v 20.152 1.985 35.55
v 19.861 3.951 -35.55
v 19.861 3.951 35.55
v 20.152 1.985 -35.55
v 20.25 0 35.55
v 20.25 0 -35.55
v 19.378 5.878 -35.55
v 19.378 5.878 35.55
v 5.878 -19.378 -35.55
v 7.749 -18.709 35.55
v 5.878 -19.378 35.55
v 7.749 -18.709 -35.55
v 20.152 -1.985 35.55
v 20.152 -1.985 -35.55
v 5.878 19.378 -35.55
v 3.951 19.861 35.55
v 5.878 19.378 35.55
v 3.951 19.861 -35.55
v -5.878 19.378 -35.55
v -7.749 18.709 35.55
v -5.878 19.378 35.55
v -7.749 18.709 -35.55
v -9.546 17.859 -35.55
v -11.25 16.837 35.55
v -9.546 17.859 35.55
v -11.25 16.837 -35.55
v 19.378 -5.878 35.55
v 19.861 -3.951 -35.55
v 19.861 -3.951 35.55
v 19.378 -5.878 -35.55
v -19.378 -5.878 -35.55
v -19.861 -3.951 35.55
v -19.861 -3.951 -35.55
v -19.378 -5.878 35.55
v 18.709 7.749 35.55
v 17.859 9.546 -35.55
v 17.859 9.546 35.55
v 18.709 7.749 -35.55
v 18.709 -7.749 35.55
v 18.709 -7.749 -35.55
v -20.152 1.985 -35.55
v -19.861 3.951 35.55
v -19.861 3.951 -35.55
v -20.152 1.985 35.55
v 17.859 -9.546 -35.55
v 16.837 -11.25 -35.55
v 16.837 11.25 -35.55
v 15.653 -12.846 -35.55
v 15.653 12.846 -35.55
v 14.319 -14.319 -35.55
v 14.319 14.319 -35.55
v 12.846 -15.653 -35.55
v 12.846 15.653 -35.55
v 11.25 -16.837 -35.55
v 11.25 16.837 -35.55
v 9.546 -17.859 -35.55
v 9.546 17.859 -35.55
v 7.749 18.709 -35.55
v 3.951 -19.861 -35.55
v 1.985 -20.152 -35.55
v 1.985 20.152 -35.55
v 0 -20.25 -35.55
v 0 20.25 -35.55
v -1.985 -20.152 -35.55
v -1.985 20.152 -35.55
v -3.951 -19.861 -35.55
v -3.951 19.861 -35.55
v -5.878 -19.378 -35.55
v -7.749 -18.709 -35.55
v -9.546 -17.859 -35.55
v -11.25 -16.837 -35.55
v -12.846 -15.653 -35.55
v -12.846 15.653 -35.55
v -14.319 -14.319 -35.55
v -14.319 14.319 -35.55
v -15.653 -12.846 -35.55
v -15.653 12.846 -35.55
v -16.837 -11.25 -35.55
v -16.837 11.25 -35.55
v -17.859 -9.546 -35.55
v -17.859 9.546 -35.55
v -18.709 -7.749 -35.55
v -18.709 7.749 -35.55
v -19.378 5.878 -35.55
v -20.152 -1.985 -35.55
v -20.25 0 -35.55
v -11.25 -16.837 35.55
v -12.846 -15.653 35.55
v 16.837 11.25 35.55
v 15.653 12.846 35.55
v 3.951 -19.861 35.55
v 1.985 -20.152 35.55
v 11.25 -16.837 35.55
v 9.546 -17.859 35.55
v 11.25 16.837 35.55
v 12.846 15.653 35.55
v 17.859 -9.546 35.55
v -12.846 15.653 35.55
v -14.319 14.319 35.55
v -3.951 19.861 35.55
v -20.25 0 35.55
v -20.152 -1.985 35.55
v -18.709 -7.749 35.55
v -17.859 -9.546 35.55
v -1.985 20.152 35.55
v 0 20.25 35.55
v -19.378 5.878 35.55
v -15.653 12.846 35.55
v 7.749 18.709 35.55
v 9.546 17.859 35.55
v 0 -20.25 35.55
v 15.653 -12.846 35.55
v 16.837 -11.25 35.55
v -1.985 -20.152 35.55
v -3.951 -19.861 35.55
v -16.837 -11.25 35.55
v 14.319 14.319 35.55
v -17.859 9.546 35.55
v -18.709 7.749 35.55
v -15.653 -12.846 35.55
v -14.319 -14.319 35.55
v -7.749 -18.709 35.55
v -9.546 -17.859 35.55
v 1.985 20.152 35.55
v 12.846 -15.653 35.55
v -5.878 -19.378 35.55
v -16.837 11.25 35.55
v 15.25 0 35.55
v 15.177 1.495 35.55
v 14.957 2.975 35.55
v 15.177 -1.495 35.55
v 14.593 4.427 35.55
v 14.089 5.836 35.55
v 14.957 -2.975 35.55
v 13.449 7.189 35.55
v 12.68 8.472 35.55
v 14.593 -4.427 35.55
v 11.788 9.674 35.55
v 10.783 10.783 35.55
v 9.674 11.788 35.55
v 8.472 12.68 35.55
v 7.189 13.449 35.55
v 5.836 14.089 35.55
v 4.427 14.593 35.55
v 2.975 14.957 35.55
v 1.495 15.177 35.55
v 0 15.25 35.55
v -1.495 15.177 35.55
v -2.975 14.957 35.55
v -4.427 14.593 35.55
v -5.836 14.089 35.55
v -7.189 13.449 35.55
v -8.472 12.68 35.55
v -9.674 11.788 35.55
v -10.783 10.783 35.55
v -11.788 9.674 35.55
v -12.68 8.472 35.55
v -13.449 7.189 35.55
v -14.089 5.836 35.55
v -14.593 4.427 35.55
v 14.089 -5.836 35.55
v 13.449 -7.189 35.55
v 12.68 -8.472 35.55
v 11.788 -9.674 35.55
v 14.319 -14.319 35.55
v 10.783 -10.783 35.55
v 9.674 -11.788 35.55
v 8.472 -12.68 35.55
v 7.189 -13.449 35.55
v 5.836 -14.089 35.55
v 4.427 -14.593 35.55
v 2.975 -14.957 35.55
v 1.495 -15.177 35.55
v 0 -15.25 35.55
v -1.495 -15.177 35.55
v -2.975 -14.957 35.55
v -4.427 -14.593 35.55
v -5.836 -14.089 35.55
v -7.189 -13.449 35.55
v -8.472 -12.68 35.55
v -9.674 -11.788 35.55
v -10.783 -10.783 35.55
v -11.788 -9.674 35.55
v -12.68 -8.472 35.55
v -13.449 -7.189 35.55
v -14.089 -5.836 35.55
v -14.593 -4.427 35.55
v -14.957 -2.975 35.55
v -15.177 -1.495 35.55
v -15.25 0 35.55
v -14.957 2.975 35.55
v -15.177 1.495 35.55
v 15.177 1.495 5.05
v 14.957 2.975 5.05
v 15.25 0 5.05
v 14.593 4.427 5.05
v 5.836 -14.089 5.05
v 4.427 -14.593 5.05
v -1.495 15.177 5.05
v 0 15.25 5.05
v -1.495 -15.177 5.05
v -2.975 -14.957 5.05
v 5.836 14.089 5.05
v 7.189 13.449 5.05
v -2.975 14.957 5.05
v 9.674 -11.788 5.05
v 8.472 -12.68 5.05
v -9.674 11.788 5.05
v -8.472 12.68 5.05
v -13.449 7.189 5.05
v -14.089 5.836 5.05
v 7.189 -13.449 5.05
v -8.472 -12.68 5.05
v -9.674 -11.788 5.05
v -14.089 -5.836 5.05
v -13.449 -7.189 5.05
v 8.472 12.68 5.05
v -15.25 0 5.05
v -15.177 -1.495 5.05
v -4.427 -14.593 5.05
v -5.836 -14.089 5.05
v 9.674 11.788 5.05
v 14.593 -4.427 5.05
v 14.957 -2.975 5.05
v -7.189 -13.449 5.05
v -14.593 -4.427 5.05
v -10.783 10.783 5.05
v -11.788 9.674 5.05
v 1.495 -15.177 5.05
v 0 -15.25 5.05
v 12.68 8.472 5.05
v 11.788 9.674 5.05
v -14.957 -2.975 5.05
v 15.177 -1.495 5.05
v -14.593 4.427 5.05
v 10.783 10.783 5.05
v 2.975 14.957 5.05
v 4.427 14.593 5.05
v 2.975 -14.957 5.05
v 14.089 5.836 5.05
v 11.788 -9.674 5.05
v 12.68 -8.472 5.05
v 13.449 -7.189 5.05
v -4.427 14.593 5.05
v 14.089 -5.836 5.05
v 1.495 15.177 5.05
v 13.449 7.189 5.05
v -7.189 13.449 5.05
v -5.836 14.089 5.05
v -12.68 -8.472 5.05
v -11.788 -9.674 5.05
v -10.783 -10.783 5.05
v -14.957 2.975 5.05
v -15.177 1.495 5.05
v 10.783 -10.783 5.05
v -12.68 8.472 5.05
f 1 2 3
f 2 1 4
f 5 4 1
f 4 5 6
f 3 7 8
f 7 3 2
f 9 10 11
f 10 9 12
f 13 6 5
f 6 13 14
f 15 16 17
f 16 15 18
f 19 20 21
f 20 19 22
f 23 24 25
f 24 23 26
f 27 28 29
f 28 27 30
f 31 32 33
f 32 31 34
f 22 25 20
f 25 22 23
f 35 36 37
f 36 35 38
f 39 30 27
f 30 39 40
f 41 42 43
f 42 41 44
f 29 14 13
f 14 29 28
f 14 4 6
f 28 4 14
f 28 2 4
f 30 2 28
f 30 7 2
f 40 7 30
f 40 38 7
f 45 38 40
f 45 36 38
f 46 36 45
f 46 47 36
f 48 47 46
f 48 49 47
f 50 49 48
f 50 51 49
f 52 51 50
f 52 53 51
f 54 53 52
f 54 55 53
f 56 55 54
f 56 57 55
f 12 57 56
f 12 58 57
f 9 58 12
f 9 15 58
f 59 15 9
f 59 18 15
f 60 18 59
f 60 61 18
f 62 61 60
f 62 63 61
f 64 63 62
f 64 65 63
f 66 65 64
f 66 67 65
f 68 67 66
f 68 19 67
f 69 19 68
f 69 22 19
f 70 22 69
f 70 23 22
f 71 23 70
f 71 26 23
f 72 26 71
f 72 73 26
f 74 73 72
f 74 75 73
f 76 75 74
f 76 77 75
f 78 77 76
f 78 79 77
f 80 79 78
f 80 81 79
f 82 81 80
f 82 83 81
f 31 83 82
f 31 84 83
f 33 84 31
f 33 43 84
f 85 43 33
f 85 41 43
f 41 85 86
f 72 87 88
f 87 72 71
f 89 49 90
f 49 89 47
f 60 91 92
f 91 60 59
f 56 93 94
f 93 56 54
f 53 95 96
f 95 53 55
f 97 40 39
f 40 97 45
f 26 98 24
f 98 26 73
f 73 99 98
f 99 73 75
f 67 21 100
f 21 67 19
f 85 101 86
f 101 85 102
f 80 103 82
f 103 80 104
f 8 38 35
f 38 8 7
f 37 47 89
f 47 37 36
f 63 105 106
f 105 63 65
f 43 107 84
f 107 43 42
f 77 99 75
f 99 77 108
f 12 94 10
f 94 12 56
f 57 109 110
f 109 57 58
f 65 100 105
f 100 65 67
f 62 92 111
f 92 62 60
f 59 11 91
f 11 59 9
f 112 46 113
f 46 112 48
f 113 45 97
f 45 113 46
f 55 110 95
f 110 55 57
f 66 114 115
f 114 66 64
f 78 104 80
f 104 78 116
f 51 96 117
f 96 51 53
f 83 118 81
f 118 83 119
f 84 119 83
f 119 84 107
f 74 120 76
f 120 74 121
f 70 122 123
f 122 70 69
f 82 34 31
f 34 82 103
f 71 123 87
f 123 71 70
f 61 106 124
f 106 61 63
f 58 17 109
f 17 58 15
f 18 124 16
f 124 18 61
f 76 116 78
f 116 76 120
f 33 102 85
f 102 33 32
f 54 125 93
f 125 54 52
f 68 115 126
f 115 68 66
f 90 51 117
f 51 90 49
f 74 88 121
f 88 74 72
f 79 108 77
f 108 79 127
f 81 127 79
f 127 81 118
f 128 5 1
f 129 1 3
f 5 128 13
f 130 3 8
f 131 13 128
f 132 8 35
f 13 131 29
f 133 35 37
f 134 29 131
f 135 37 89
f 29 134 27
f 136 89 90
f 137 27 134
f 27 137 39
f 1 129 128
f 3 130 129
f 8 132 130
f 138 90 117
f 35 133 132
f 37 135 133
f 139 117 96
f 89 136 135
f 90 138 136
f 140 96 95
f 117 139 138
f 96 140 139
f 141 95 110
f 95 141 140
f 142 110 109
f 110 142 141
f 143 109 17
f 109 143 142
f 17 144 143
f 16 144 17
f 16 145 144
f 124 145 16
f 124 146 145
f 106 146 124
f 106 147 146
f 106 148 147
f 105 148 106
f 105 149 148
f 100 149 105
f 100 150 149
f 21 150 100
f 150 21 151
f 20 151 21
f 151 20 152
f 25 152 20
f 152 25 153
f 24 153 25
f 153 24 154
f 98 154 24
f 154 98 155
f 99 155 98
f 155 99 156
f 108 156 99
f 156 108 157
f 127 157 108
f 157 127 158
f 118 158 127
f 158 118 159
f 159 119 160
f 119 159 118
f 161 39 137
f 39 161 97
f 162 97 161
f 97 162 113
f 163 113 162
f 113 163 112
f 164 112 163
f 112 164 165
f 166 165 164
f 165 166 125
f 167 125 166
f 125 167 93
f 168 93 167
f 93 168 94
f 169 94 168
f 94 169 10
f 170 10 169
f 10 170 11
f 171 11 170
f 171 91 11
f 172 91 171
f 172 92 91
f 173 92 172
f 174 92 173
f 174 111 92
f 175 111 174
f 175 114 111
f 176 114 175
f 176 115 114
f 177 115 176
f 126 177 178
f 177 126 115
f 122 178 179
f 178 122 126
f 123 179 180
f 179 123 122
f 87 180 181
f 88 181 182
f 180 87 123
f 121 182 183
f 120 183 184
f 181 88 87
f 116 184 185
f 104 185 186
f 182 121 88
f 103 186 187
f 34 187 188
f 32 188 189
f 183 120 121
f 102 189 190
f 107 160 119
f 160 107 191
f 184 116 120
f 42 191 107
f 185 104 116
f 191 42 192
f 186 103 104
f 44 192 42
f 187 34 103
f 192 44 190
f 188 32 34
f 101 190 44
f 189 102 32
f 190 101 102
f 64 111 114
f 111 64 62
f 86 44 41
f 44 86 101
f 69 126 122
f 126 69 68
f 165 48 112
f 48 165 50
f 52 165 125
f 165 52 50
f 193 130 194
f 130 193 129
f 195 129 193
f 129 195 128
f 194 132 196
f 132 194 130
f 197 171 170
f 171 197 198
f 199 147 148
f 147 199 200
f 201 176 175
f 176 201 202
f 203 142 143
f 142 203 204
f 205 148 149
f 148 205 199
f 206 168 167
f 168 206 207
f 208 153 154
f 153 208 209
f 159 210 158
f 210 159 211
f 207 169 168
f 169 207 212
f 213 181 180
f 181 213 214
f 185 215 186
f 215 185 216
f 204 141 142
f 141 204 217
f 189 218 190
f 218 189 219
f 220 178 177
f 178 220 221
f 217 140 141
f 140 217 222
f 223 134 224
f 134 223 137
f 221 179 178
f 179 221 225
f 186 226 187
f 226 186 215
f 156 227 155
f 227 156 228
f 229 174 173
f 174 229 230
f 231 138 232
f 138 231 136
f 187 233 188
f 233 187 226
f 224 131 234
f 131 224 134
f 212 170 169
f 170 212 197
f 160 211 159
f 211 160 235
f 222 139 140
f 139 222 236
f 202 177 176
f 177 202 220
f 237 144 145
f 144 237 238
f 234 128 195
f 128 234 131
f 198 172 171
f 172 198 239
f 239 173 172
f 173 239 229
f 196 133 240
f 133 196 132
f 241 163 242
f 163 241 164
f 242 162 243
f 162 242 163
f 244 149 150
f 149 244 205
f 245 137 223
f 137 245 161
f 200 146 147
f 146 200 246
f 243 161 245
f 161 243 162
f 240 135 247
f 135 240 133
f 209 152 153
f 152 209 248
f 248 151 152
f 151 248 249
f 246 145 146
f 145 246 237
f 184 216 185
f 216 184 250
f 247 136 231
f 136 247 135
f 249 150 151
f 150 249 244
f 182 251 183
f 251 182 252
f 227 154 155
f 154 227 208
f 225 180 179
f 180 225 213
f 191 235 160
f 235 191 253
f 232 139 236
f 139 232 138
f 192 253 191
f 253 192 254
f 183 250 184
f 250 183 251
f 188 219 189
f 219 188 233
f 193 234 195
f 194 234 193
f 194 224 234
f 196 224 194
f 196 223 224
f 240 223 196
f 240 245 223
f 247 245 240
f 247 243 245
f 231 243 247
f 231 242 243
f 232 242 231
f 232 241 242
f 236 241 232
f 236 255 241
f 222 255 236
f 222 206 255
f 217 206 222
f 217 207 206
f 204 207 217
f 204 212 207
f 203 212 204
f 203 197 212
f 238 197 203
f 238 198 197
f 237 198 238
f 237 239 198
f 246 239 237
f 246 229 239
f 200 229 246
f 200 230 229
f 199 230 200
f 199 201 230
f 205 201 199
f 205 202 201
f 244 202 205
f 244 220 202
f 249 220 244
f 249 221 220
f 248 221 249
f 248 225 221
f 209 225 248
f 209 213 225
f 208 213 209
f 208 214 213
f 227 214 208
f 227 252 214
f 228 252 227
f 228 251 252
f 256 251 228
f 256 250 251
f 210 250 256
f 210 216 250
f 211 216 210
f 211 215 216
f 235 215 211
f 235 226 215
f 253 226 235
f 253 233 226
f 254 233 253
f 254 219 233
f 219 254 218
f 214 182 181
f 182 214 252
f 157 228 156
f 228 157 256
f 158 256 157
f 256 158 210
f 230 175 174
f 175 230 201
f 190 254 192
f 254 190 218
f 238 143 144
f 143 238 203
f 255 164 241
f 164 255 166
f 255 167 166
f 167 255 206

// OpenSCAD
module riser(
  leg_d=30.5,
  rise=40.6,
)
{
  wall_thickness=5;
  leg_overlap=leg_d;
  outer_d=leg_d+2*wall_thickness;
  total_h=rise+leg_overlap;
  difference() 
  {
    cylinder(d=outer_d,h=total_h, center=true, $fn=64);
    translate([0,0,total_h/2-leg_overlap/2])cylinder(d=leg_d,h=leg_overlap, center=true, $fn=64);
  }
  
}
 

riser();
  
